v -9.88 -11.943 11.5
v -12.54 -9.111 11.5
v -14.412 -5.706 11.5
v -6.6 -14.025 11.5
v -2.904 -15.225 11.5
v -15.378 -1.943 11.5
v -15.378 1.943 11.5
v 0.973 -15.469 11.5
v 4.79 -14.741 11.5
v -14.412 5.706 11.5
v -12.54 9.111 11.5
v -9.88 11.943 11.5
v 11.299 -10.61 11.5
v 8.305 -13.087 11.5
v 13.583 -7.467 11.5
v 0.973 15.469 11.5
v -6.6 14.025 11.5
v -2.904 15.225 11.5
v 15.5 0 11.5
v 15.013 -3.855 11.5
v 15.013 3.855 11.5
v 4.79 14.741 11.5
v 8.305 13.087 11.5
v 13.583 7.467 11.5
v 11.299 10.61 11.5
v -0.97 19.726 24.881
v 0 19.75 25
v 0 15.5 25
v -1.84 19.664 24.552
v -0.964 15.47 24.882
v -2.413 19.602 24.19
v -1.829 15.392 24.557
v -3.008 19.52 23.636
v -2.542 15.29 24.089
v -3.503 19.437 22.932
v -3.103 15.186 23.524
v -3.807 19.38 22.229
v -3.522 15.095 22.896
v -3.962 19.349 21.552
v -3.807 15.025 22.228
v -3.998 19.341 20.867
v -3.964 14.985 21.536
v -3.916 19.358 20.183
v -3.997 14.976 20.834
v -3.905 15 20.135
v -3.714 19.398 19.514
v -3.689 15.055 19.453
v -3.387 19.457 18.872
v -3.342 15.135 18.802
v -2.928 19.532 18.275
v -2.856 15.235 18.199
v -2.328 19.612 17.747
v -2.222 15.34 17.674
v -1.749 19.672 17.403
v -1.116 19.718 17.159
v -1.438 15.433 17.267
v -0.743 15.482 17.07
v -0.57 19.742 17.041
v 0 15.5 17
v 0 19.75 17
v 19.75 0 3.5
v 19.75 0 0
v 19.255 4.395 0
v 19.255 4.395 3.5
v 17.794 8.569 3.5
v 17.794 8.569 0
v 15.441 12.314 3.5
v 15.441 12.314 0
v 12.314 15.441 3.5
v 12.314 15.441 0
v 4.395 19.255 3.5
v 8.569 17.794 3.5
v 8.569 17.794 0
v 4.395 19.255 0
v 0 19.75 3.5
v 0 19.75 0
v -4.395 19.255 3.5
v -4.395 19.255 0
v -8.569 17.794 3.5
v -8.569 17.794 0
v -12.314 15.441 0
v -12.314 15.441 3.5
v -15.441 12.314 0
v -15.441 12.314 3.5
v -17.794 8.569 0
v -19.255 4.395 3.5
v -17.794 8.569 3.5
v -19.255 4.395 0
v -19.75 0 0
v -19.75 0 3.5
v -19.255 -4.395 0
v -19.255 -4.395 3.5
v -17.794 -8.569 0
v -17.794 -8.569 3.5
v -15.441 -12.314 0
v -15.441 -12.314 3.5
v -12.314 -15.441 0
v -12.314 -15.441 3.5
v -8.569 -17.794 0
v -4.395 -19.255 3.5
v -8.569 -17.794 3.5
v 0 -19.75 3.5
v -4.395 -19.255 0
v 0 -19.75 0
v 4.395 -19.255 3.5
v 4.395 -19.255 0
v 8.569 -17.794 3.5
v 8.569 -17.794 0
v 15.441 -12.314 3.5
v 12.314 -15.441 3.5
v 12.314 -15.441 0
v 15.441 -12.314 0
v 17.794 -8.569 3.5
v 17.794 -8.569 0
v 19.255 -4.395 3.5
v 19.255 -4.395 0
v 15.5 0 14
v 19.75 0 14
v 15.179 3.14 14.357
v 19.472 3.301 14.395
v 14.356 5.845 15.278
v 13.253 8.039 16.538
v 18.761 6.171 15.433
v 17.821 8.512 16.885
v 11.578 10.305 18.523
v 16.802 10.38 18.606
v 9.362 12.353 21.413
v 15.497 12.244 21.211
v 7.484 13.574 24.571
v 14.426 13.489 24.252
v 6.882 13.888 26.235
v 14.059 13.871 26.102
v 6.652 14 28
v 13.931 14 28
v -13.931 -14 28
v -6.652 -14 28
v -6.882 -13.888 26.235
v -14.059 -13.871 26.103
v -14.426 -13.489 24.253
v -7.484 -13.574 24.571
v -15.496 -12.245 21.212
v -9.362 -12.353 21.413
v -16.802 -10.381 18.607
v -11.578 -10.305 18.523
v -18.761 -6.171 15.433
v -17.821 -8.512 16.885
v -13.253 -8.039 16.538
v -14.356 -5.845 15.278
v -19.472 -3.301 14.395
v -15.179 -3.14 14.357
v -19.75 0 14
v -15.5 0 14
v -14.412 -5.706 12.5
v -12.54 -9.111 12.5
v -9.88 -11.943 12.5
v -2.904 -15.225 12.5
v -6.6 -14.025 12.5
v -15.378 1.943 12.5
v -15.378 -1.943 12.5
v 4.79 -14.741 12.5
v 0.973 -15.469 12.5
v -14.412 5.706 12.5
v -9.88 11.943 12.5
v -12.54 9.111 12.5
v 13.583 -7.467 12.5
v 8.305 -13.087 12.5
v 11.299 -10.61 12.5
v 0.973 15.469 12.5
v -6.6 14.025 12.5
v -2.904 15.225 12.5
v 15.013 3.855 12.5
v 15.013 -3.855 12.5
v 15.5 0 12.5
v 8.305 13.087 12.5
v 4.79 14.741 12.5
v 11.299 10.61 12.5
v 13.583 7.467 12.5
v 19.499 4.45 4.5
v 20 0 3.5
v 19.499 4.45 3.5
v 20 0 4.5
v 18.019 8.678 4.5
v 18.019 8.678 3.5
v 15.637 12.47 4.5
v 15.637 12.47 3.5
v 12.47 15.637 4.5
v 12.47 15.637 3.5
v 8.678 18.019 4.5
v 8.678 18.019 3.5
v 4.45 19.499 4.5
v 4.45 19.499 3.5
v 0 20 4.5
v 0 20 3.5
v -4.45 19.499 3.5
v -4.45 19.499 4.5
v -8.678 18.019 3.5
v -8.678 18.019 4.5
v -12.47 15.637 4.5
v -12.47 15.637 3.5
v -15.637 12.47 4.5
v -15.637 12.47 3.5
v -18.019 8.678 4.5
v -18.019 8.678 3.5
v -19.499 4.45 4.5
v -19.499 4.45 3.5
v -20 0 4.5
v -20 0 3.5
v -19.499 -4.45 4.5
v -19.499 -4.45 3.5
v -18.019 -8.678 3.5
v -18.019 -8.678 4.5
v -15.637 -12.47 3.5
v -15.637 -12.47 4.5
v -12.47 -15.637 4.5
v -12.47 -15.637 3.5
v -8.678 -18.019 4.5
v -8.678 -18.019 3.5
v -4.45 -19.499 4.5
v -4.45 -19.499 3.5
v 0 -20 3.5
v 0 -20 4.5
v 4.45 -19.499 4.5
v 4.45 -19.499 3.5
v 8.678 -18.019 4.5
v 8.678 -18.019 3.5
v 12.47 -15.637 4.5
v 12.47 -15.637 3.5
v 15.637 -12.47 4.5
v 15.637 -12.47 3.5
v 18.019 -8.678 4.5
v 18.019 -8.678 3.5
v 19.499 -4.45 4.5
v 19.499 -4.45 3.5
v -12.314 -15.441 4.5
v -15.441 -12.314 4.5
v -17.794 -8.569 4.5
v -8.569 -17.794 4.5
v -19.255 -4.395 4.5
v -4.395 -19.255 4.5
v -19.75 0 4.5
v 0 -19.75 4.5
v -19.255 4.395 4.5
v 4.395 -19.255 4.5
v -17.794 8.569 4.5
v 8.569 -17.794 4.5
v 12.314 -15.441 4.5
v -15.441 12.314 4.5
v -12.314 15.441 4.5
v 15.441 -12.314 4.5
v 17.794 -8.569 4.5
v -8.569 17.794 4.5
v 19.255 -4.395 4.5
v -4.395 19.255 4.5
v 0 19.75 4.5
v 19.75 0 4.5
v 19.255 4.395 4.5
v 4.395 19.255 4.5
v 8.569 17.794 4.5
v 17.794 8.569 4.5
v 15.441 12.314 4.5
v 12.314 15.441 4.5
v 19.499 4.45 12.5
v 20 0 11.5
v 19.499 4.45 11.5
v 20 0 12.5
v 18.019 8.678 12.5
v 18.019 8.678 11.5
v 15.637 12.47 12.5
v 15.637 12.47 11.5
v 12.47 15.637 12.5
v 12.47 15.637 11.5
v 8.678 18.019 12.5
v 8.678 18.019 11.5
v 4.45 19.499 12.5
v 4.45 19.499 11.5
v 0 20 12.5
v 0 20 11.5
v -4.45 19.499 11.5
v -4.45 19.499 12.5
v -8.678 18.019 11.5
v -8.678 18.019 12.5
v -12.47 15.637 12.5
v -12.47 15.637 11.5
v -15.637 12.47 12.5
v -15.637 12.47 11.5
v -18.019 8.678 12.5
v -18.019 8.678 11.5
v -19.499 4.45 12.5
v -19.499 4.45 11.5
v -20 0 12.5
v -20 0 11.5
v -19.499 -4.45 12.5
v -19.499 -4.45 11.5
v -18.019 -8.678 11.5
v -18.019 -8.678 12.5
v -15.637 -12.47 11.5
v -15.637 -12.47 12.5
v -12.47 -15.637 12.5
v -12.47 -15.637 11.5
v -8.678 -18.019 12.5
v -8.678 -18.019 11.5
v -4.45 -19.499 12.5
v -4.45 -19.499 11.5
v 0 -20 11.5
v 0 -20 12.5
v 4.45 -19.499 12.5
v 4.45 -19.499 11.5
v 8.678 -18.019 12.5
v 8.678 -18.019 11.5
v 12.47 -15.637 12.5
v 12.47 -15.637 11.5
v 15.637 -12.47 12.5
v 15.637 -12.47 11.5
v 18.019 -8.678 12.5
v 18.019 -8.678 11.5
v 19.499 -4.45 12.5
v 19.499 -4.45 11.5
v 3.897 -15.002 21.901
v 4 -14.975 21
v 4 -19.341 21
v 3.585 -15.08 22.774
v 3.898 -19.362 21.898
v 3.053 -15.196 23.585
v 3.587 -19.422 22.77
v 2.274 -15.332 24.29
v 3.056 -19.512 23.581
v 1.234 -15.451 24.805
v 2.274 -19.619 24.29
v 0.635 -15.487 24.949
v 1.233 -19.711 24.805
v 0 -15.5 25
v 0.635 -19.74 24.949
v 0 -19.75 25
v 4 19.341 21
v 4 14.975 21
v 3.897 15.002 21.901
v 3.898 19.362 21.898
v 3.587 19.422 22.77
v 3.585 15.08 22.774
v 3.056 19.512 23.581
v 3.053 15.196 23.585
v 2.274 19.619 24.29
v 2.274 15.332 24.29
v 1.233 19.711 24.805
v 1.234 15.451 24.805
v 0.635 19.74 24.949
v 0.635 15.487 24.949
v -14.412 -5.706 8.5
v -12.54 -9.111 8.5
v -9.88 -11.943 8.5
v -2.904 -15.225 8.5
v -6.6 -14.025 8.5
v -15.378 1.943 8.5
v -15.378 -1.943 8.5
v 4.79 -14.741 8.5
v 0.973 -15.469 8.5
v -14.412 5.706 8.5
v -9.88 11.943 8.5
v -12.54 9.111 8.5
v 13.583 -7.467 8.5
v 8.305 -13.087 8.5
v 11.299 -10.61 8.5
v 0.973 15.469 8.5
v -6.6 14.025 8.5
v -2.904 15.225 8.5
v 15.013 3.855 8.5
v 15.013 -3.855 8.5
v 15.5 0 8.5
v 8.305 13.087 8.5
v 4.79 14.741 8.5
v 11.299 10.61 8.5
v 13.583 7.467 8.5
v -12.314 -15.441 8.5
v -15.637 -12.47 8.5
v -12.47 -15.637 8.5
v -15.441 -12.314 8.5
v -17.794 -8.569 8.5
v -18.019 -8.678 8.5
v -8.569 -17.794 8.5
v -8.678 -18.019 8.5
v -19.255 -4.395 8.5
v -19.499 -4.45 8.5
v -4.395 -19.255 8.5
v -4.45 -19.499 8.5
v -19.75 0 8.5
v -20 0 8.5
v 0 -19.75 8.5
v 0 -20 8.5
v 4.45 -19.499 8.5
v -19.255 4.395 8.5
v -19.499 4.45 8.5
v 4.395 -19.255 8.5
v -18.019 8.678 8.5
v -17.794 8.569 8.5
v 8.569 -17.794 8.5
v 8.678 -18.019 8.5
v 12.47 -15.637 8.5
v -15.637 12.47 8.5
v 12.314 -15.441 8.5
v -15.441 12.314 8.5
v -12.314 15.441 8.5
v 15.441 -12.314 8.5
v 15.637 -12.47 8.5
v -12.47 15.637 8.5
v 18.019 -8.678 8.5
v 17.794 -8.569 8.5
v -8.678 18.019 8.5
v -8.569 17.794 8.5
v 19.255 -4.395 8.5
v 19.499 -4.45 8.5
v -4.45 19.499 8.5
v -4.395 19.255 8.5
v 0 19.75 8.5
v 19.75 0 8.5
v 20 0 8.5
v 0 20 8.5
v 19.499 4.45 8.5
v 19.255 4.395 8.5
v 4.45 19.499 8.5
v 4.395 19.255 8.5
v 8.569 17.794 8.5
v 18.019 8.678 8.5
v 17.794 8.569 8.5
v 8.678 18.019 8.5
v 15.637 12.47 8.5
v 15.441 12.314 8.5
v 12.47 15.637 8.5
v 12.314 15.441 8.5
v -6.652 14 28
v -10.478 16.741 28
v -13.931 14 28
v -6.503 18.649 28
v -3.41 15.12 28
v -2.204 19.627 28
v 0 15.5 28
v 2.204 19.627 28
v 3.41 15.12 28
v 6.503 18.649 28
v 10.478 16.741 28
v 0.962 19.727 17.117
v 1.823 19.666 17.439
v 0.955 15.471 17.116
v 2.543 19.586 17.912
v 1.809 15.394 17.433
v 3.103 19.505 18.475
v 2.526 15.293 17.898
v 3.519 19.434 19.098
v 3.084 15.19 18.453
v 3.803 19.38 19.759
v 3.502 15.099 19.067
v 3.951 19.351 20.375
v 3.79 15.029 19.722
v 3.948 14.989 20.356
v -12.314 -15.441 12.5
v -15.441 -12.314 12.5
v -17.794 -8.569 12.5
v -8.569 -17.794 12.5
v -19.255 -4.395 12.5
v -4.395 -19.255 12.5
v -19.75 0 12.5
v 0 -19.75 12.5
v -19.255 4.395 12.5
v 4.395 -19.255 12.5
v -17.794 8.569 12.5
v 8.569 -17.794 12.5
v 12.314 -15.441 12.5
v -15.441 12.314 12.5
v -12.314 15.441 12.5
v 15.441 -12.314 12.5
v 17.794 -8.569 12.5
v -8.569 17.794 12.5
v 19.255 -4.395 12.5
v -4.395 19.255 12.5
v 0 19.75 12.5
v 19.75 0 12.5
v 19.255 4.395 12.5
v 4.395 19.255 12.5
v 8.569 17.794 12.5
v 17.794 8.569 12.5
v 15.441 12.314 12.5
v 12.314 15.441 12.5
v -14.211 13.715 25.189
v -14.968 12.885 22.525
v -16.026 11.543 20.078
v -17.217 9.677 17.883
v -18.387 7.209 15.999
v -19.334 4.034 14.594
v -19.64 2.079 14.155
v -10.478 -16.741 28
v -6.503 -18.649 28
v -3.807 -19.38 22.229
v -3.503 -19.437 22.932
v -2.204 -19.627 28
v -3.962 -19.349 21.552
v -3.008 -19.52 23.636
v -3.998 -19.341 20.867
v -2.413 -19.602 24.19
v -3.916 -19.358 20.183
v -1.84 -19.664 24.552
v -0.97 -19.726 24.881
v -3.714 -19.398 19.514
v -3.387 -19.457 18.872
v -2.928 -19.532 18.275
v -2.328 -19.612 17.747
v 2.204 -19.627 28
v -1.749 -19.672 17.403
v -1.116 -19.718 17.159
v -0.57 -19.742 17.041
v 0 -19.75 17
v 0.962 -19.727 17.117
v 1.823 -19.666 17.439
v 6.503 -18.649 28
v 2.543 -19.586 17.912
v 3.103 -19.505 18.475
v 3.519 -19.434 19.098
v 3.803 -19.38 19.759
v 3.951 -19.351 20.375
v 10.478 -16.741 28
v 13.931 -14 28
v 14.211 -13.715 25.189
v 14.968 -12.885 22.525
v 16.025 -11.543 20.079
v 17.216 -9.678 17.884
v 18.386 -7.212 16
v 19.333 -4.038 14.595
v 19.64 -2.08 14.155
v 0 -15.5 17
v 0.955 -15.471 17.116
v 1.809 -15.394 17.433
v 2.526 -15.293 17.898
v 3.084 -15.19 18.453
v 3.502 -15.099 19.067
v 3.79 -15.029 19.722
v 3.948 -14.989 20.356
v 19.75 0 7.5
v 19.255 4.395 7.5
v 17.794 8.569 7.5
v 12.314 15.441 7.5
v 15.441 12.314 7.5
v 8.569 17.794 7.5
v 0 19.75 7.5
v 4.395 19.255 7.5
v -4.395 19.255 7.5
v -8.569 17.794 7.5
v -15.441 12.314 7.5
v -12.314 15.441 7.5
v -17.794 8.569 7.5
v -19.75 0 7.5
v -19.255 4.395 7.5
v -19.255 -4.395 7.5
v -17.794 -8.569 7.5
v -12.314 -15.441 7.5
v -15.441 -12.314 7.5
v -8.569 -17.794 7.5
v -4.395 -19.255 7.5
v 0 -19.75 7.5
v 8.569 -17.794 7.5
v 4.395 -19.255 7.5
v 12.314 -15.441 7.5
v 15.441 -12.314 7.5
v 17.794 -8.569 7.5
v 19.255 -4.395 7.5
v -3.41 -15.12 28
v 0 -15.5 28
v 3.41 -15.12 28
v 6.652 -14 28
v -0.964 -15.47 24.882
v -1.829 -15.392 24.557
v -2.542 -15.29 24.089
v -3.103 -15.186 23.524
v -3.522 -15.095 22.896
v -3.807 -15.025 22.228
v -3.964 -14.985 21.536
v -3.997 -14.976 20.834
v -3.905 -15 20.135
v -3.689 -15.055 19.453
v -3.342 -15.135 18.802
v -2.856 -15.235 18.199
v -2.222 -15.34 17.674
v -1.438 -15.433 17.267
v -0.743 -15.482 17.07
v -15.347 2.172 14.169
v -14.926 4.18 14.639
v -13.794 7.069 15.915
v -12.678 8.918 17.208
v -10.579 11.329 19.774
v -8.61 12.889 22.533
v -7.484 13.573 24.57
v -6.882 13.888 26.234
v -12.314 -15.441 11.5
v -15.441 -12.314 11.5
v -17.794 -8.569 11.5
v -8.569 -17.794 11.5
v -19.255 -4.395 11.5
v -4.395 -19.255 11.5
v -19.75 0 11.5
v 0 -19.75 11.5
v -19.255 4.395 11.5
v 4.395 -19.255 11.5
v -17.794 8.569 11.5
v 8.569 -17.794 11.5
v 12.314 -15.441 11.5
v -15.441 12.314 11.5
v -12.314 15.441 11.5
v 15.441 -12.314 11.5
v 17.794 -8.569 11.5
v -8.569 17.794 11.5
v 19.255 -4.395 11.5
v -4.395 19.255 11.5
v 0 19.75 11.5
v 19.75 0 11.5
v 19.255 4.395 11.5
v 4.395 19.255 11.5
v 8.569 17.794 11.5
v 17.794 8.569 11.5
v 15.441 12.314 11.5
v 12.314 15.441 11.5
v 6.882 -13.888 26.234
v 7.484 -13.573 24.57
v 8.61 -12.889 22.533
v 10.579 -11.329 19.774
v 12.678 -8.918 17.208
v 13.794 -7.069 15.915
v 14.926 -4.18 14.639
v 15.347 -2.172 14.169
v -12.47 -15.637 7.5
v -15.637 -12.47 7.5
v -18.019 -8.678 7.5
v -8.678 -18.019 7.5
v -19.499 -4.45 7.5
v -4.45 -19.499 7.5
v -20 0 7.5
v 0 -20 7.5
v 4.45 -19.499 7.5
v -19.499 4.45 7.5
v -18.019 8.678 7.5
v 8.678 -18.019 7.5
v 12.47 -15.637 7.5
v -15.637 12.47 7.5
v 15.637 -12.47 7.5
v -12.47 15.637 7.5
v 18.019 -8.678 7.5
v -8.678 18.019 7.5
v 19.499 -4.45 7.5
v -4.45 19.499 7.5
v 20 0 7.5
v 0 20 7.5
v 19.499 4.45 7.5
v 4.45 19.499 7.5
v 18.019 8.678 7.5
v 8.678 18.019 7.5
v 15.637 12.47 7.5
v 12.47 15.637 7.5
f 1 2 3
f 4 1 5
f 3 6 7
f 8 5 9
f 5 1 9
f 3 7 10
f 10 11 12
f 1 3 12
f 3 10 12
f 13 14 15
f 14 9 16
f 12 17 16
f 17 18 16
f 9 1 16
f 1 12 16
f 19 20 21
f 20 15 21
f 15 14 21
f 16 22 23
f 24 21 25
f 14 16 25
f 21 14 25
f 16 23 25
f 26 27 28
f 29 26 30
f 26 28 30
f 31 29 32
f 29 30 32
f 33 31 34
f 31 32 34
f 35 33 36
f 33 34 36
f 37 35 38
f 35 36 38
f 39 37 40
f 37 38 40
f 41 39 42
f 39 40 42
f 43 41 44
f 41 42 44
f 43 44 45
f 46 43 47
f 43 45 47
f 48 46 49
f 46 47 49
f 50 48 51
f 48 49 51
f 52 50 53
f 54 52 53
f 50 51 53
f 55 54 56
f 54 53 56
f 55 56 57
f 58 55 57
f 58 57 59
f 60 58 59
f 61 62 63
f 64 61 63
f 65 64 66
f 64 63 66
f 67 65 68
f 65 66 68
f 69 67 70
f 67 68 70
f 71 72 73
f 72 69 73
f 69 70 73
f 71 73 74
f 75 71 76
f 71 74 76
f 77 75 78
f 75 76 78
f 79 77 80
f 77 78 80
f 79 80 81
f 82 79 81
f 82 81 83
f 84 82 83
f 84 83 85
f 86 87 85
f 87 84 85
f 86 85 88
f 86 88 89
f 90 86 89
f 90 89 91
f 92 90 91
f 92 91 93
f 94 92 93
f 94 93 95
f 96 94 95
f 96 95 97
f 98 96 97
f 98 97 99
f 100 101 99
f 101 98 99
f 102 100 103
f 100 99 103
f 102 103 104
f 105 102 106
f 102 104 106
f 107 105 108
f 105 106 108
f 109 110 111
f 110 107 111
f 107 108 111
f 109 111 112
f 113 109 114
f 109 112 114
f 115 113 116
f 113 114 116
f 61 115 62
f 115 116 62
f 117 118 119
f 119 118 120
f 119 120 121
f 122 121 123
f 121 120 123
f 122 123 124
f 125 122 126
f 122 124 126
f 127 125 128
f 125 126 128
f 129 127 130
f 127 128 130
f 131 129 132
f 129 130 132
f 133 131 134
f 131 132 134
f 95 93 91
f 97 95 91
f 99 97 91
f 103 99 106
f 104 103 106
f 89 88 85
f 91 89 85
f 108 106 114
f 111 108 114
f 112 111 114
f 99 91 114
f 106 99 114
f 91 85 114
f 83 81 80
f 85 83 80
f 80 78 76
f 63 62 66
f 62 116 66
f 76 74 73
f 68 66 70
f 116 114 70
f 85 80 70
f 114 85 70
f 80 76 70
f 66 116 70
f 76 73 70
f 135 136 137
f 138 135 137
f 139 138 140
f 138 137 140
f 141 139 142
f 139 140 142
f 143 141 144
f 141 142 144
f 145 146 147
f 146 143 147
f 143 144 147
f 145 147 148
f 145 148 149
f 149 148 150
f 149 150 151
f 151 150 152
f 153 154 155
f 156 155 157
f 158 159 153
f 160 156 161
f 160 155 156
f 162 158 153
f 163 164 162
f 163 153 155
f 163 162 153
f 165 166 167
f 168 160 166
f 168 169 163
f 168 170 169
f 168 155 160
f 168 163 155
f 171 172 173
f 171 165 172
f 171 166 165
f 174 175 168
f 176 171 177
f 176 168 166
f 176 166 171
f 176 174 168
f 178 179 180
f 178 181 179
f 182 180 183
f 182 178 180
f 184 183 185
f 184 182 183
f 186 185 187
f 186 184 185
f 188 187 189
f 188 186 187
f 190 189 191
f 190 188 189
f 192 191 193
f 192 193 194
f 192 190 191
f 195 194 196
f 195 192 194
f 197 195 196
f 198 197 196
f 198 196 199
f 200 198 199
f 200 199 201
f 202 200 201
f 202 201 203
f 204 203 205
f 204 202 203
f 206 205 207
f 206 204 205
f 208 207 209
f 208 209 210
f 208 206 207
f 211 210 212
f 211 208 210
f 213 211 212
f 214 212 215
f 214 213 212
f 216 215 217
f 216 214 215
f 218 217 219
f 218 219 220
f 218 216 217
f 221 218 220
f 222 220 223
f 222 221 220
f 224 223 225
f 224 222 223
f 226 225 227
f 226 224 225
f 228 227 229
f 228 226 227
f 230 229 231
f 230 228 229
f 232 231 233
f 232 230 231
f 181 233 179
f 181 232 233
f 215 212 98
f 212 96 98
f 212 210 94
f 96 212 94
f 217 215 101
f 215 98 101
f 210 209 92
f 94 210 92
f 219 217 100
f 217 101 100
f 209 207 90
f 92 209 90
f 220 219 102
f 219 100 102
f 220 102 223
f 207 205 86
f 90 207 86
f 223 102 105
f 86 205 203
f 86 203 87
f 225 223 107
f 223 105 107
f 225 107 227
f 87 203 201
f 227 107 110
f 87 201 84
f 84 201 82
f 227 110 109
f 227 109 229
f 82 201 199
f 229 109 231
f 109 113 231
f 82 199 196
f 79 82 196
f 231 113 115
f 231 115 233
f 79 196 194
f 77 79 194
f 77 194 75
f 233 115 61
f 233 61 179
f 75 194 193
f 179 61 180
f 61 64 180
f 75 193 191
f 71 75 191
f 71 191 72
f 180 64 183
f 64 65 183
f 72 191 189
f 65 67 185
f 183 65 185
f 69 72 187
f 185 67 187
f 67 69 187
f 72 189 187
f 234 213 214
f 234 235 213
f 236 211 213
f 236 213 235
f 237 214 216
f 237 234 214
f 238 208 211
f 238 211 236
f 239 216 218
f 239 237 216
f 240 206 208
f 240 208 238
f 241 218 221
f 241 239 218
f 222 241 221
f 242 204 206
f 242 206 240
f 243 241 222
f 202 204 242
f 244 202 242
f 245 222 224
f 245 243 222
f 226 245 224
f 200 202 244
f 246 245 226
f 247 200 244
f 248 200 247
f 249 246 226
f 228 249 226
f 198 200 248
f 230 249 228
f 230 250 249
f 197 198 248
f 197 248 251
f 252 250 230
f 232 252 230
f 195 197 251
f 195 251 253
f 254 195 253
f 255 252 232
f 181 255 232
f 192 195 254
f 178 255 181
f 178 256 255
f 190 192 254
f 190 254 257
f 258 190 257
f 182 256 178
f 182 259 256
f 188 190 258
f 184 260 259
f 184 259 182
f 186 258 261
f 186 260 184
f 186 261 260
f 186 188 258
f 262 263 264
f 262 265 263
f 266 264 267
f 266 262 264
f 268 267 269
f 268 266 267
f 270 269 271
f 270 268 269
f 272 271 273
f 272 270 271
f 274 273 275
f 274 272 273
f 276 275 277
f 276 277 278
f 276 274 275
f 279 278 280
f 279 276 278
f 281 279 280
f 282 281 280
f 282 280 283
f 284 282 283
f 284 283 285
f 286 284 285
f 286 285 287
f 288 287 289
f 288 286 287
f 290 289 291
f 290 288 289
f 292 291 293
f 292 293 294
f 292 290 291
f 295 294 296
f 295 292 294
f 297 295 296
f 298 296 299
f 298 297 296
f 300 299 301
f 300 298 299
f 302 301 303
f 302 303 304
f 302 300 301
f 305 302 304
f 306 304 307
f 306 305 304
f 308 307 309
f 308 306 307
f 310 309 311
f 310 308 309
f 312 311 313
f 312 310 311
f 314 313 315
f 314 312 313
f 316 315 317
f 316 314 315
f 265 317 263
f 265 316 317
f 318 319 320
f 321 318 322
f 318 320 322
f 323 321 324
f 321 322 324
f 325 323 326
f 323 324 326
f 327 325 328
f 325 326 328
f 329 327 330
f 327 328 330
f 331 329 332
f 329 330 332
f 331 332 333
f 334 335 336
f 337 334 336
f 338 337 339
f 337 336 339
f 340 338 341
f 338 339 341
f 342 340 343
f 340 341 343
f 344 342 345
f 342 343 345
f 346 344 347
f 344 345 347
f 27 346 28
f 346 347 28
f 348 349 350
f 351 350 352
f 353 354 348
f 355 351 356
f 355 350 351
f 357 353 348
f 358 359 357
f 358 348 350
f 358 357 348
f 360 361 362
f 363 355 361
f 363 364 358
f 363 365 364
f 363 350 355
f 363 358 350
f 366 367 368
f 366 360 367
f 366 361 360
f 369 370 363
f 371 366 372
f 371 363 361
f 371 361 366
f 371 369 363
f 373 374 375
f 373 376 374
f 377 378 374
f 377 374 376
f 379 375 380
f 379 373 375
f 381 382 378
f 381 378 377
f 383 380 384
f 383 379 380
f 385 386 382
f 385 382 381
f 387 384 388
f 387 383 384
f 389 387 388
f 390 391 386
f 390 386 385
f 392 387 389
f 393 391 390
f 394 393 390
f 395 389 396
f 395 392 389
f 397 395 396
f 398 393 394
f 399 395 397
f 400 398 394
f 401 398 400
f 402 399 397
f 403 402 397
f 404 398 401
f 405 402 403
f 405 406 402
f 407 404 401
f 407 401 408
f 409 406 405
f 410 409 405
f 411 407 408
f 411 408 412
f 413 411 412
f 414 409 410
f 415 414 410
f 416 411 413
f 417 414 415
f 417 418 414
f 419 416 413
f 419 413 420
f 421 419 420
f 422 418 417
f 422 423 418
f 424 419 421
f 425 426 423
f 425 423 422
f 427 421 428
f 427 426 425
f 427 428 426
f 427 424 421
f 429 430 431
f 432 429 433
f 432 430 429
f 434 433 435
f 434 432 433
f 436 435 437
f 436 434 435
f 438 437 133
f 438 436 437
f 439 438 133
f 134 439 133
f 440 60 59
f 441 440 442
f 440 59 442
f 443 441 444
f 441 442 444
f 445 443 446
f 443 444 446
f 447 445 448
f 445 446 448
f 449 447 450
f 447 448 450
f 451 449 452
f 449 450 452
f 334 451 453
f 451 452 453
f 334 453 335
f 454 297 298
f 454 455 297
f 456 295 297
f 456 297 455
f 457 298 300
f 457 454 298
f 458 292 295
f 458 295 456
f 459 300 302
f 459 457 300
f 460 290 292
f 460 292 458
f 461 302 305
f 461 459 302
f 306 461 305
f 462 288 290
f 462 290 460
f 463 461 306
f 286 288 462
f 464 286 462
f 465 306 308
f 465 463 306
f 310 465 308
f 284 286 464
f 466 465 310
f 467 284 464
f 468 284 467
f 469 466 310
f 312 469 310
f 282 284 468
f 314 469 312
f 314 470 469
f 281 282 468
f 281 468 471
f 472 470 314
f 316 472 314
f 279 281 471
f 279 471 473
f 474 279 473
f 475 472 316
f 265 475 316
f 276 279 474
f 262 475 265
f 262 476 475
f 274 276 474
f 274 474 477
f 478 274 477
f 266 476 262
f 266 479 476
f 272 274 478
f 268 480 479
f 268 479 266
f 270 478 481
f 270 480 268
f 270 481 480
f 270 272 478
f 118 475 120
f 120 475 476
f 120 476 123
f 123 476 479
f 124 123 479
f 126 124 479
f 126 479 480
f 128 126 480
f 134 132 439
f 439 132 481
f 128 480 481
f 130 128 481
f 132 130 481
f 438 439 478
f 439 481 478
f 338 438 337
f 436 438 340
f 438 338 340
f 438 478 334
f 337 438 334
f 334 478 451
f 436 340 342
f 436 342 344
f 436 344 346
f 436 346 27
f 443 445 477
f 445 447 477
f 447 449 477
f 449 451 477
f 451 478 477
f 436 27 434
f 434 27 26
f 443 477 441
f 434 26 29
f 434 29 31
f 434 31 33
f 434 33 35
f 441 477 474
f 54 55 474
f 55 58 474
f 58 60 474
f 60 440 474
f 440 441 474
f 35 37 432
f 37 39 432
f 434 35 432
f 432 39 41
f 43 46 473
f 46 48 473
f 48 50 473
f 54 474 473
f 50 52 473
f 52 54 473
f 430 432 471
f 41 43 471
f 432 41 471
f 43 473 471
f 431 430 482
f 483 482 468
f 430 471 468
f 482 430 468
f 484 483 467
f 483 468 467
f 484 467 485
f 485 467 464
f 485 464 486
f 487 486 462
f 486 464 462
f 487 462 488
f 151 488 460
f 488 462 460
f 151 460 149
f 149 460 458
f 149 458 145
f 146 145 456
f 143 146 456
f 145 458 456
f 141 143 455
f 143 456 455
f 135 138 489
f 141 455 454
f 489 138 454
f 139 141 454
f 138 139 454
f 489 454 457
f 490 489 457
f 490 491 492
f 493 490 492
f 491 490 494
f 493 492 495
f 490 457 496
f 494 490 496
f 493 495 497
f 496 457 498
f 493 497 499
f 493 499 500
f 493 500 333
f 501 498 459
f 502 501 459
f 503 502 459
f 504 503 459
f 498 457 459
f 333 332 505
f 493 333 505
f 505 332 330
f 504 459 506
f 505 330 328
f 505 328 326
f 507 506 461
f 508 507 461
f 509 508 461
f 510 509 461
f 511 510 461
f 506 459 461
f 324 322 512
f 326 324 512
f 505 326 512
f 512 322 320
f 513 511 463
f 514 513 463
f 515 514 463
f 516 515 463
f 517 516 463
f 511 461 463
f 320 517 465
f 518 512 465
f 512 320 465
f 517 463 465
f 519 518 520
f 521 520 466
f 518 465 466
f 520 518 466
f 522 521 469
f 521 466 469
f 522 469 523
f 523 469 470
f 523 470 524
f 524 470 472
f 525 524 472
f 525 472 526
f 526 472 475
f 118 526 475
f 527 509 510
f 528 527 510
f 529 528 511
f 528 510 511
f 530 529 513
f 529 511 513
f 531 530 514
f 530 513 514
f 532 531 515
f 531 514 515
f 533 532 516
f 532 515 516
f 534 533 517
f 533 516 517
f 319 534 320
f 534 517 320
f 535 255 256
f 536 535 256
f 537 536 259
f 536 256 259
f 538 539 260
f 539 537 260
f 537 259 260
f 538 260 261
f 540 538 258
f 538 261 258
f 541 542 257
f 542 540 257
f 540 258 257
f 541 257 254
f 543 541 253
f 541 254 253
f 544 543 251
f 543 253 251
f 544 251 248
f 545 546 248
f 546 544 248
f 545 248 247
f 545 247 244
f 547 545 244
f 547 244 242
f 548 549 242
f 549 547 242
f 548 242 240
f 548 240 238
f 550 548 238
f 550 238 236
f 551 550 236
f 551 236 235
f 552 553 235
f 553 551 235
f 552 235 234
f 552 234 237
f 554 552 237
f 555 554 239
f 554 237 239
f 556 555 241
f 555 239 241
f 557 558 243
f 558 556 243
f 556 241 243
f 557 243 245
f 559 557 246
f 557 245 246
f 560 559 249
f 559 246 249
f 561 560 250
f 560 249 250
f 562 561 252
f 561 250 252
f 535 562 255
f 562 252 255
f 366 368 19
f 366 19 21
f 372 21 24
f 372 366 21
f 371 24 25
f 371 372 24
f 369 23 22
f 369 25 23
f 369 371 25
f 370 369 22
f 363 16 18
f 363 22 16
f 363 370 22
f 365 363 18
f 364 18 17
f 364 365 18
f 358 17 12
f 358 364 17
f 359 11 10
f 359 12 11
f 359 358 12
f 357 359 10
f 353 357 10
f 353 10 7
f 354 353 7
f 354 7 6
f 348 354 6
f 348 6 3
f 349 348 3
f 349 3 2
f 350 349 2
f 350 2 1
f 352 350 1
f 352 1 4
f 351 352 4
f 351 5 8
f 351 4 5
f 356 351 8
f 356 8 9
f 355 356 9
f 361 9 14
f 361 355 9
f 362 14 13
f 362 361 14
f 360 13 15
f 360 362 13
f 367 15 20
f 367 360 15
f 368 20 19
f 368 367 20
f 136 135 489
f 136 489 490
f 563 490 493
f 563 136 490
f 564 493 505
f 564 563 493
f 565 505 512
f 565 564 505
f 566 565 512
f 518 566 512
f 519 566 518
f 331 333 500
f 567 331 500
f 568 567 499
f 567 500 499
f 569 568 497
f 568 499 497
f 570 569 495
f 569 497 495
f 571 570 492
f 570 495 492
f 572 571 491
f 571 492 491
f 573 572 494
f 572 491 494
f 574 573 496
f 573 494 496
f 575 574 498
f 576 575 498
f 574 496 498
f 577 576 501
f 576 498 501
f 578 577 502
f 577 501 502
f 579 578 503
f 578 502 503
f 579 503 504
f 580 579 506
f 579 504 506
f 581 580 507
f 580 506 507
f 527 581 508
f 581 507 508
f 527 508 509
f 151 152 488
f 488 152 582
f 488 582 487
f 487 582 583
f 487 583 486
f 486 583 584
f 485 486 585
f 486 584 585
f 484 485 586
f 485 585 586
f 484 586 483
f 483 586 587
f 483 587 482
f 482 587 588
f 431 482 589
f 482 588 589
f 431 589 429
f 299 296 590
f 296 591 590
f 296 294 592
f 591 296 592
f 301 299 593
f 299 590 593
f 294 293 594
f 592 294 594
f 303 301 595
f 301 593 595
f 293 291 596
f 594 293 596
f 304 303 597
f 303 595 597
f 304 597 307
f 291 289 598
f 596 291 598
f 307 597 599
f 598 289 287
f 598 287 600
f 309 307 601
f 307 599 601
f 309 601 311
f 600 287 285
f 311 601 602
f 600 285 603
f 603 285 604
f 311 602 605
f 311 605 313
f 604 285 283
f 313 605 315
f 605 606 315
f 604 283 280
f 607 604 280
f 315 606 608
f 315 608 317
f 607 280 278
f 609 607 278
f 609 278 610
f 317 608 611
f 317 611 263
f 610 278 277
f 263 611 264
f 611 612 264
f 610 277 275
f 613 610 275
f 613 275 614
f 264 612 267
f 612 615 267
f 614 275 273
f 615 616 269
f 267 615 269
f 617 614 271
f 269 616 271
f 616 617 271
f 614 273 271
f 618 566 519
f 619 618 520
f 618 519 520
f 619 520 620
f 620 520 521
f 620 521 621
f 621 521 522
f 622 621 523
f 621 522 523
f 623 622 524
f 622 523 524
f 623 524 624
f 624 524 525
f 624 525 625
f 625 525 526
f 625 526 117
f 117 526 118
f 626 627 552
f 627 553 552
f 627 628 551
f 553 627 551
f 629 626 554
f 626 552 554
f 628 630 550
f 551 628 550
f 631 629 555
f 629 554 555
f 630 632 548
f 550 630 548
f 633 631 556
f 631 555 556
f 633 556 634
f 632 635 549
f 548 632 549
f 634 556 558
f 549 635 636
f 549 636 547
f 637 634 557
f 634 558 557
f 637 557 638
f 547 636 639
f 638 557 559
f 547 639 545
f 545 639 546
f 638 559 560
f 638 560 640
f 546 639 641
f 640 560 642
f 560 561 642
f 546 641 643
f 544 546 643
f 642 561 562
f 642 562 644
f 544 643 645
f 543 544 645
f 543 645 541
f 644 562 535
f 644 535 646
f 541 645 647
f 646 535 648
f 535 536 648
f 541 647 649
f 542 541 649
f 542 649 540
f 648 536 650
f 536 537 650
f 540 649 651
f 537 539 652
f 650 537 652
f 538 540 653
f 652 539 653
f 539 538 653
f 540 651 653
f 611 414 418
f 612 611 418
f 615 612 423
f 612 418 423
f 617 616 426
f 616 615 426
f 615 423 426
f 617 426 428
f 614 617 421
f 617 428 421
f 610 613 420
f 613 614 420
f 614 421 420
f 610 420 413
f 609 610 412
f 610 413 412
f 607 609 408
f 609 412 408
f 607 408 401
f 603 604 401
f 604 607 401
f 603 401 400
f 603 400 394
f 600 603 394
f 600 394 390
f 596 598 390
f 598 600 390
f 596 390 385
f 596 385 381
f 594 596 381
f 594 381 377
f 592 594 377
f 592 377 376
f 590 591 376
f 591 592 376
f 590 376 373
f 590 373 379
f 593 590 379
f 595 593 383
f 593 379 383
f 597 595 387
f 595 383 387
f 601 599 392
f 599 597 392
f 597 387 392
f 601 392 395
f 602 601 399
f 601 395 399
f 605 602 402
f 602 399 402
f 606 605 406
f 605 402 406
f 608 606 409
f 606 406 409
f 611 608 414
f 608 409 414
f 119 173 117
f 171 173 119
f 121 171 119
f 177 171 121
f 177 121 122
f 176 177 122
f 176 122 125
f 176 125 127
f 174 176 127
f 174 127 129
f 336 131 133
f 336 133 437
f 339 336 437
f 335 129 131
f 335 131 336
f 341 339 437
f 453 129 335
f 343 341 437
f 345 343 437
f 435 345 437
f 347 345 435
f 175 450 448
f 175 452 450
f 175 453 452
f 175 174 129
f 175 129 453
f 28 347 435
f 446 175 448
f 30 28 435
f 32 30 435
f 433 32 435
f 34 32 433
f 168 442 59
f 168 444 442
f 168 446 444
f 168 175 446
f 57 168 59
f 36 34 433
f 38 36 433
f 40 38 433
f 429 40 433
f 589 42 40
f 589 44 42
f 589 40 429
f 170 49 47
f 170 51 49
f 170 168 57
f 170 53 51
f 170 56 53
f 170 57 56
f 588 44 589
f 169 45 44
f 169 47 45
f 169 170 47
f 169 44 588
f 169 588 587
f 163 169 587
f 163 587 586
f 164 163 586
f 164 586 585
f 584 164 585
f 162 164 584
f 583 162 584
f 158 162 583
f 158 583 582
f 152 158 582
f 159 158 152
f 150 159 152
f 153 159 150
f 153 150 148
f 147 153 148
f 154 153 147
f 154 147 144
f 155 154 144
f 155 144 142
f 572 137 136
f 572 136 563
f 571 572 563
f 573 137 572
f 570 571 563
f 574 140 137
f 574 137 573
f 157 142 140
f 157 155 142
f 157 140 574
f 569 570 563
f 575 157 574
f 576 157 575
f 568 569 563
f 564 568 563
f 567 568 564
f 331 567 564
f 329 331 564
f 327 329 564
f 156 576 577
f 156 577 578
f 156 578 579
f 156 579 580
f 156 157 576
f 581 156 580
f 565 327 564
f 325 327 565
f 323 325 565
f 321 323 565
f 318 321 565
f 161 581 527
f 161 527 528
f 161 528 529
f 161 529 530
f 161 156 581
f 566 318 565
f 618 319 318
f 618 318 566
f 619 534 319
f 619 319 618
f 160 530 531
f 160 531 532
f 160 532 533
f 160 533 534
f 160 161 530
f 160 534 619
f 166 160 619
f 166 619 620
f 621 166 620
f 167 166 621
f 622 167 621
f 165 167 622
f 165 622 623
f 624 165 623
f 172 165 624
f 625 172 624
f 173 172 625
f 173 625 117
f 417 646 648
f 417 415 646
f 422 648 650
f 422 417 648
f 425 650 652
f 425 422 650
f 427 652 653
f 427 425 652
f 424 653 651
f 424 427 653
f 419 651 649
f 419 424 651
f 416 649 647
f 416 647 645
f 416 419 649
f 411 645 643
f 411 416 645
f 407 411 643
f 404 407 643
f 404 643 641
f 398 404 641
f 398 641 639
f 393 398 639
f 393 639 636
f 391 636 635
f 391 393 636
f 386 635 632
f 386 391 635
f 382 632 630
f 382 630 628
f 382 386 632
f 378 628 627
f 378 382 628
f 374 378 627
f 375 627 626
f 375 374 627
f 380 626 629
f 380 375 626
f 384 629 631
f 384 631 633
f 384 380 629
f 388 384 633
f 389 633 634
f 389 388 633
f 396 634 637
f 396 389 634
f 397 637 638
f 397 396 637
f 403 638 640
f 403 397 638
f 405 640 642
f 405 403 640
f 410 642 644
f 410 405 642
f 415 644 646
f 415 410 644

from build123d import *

# Parameters (mm, degrees)
F0_R      = 19.75
F0_R_2    = 15.5
F1_DEPTH  = 28
F2_DEPTH  = 8
F4_DEPTH  = 50
F7_R      = 20
F8_DEPTH  = 0.5
F10_R     = 20
F11_DEPTH = 0.5
F13_R     = 20
F14_DEPTH = 0.5
F16_DEPTH = 50


with BuildPart() as f1:
    # F0 (on Top) → F1 (new body)
    with BuildSketch(Plane.XY):
        Circle(F0_R)
        Circle(F0_R_2, mode=Mode.SUBTRACT)
    extrude(amount=F1_DEPTH)

    # F0 (on Top) → F2 (join)
    with BuildSketch(Plane.XY):
        Circle(F0_R_2)
    extrude(amount=F2_DEPTH)

    # F3 (on Front) → F4 (cut, symmetric)
    with BuildSketch(Plane.XZ):
        with BuildLine():
            ThreePointArc((0, 25), (-4, 21), (0, 17))
            Line((0, 17), (0, 21))
            Line((0, 21), (0, 25))
        make_face()
        with BuildLine():
            Line((0, 21), (0, 17))
            ThreePointArc((0, 17), (2.828427, 18.171573), (4, 21))
            ThreePointArc((4, 21), (2.828427, 23.828427), (0, 25))
            Line((0, 25), (0, 21))
        make_face()
    extrude(amount=F4_DEPTH, both=True, mode=Mode.SUBTRACT)

    # F7 (on plane+point) → F8 (join, symmetric)
    with BuildSketch(Plane.XY.offset(4)):
        Circle(F7_R)
    extrude(amount=F8_DEPTH, both=True)

    # F10 (on plane+point) → F11 (join, symmetric)
    with BuildSketch(Plane.XY.offset(8)):
        Circle(F10_R)
    extrude(amount=F11_DEPTH, both=True)

    # F13 (on plane+point) → F14 (join, symmetric)
    with BuildSketch(Plane.XY.offset(12)):
        Circle(F13_R)
    extrude(amount=F14_DEPTH, both=True)

    # F15 (on Right) → F16 (cut, symmetric)
    with BuildSketch(Plane.YZ):
        with BuildLine():
            ThreePointArc((-14, 28), (-9.899495, 18.100505), (0, 14))
            Line((0, 14), (0, 28))
            Line((0, 28), (-14, 28))
        make_face()
        with BuildLine():
            Line((0, 28), (0, 14))
            ThreePointArc((0, 14), (9.899495, 18.100505), (14, 28))
            Line((14, 28), (0, 28))
        make_face()
    extrude(amount=F16_DEPTH, both=True, mode=Mode.SUBTRACT)


solid = f1.part
